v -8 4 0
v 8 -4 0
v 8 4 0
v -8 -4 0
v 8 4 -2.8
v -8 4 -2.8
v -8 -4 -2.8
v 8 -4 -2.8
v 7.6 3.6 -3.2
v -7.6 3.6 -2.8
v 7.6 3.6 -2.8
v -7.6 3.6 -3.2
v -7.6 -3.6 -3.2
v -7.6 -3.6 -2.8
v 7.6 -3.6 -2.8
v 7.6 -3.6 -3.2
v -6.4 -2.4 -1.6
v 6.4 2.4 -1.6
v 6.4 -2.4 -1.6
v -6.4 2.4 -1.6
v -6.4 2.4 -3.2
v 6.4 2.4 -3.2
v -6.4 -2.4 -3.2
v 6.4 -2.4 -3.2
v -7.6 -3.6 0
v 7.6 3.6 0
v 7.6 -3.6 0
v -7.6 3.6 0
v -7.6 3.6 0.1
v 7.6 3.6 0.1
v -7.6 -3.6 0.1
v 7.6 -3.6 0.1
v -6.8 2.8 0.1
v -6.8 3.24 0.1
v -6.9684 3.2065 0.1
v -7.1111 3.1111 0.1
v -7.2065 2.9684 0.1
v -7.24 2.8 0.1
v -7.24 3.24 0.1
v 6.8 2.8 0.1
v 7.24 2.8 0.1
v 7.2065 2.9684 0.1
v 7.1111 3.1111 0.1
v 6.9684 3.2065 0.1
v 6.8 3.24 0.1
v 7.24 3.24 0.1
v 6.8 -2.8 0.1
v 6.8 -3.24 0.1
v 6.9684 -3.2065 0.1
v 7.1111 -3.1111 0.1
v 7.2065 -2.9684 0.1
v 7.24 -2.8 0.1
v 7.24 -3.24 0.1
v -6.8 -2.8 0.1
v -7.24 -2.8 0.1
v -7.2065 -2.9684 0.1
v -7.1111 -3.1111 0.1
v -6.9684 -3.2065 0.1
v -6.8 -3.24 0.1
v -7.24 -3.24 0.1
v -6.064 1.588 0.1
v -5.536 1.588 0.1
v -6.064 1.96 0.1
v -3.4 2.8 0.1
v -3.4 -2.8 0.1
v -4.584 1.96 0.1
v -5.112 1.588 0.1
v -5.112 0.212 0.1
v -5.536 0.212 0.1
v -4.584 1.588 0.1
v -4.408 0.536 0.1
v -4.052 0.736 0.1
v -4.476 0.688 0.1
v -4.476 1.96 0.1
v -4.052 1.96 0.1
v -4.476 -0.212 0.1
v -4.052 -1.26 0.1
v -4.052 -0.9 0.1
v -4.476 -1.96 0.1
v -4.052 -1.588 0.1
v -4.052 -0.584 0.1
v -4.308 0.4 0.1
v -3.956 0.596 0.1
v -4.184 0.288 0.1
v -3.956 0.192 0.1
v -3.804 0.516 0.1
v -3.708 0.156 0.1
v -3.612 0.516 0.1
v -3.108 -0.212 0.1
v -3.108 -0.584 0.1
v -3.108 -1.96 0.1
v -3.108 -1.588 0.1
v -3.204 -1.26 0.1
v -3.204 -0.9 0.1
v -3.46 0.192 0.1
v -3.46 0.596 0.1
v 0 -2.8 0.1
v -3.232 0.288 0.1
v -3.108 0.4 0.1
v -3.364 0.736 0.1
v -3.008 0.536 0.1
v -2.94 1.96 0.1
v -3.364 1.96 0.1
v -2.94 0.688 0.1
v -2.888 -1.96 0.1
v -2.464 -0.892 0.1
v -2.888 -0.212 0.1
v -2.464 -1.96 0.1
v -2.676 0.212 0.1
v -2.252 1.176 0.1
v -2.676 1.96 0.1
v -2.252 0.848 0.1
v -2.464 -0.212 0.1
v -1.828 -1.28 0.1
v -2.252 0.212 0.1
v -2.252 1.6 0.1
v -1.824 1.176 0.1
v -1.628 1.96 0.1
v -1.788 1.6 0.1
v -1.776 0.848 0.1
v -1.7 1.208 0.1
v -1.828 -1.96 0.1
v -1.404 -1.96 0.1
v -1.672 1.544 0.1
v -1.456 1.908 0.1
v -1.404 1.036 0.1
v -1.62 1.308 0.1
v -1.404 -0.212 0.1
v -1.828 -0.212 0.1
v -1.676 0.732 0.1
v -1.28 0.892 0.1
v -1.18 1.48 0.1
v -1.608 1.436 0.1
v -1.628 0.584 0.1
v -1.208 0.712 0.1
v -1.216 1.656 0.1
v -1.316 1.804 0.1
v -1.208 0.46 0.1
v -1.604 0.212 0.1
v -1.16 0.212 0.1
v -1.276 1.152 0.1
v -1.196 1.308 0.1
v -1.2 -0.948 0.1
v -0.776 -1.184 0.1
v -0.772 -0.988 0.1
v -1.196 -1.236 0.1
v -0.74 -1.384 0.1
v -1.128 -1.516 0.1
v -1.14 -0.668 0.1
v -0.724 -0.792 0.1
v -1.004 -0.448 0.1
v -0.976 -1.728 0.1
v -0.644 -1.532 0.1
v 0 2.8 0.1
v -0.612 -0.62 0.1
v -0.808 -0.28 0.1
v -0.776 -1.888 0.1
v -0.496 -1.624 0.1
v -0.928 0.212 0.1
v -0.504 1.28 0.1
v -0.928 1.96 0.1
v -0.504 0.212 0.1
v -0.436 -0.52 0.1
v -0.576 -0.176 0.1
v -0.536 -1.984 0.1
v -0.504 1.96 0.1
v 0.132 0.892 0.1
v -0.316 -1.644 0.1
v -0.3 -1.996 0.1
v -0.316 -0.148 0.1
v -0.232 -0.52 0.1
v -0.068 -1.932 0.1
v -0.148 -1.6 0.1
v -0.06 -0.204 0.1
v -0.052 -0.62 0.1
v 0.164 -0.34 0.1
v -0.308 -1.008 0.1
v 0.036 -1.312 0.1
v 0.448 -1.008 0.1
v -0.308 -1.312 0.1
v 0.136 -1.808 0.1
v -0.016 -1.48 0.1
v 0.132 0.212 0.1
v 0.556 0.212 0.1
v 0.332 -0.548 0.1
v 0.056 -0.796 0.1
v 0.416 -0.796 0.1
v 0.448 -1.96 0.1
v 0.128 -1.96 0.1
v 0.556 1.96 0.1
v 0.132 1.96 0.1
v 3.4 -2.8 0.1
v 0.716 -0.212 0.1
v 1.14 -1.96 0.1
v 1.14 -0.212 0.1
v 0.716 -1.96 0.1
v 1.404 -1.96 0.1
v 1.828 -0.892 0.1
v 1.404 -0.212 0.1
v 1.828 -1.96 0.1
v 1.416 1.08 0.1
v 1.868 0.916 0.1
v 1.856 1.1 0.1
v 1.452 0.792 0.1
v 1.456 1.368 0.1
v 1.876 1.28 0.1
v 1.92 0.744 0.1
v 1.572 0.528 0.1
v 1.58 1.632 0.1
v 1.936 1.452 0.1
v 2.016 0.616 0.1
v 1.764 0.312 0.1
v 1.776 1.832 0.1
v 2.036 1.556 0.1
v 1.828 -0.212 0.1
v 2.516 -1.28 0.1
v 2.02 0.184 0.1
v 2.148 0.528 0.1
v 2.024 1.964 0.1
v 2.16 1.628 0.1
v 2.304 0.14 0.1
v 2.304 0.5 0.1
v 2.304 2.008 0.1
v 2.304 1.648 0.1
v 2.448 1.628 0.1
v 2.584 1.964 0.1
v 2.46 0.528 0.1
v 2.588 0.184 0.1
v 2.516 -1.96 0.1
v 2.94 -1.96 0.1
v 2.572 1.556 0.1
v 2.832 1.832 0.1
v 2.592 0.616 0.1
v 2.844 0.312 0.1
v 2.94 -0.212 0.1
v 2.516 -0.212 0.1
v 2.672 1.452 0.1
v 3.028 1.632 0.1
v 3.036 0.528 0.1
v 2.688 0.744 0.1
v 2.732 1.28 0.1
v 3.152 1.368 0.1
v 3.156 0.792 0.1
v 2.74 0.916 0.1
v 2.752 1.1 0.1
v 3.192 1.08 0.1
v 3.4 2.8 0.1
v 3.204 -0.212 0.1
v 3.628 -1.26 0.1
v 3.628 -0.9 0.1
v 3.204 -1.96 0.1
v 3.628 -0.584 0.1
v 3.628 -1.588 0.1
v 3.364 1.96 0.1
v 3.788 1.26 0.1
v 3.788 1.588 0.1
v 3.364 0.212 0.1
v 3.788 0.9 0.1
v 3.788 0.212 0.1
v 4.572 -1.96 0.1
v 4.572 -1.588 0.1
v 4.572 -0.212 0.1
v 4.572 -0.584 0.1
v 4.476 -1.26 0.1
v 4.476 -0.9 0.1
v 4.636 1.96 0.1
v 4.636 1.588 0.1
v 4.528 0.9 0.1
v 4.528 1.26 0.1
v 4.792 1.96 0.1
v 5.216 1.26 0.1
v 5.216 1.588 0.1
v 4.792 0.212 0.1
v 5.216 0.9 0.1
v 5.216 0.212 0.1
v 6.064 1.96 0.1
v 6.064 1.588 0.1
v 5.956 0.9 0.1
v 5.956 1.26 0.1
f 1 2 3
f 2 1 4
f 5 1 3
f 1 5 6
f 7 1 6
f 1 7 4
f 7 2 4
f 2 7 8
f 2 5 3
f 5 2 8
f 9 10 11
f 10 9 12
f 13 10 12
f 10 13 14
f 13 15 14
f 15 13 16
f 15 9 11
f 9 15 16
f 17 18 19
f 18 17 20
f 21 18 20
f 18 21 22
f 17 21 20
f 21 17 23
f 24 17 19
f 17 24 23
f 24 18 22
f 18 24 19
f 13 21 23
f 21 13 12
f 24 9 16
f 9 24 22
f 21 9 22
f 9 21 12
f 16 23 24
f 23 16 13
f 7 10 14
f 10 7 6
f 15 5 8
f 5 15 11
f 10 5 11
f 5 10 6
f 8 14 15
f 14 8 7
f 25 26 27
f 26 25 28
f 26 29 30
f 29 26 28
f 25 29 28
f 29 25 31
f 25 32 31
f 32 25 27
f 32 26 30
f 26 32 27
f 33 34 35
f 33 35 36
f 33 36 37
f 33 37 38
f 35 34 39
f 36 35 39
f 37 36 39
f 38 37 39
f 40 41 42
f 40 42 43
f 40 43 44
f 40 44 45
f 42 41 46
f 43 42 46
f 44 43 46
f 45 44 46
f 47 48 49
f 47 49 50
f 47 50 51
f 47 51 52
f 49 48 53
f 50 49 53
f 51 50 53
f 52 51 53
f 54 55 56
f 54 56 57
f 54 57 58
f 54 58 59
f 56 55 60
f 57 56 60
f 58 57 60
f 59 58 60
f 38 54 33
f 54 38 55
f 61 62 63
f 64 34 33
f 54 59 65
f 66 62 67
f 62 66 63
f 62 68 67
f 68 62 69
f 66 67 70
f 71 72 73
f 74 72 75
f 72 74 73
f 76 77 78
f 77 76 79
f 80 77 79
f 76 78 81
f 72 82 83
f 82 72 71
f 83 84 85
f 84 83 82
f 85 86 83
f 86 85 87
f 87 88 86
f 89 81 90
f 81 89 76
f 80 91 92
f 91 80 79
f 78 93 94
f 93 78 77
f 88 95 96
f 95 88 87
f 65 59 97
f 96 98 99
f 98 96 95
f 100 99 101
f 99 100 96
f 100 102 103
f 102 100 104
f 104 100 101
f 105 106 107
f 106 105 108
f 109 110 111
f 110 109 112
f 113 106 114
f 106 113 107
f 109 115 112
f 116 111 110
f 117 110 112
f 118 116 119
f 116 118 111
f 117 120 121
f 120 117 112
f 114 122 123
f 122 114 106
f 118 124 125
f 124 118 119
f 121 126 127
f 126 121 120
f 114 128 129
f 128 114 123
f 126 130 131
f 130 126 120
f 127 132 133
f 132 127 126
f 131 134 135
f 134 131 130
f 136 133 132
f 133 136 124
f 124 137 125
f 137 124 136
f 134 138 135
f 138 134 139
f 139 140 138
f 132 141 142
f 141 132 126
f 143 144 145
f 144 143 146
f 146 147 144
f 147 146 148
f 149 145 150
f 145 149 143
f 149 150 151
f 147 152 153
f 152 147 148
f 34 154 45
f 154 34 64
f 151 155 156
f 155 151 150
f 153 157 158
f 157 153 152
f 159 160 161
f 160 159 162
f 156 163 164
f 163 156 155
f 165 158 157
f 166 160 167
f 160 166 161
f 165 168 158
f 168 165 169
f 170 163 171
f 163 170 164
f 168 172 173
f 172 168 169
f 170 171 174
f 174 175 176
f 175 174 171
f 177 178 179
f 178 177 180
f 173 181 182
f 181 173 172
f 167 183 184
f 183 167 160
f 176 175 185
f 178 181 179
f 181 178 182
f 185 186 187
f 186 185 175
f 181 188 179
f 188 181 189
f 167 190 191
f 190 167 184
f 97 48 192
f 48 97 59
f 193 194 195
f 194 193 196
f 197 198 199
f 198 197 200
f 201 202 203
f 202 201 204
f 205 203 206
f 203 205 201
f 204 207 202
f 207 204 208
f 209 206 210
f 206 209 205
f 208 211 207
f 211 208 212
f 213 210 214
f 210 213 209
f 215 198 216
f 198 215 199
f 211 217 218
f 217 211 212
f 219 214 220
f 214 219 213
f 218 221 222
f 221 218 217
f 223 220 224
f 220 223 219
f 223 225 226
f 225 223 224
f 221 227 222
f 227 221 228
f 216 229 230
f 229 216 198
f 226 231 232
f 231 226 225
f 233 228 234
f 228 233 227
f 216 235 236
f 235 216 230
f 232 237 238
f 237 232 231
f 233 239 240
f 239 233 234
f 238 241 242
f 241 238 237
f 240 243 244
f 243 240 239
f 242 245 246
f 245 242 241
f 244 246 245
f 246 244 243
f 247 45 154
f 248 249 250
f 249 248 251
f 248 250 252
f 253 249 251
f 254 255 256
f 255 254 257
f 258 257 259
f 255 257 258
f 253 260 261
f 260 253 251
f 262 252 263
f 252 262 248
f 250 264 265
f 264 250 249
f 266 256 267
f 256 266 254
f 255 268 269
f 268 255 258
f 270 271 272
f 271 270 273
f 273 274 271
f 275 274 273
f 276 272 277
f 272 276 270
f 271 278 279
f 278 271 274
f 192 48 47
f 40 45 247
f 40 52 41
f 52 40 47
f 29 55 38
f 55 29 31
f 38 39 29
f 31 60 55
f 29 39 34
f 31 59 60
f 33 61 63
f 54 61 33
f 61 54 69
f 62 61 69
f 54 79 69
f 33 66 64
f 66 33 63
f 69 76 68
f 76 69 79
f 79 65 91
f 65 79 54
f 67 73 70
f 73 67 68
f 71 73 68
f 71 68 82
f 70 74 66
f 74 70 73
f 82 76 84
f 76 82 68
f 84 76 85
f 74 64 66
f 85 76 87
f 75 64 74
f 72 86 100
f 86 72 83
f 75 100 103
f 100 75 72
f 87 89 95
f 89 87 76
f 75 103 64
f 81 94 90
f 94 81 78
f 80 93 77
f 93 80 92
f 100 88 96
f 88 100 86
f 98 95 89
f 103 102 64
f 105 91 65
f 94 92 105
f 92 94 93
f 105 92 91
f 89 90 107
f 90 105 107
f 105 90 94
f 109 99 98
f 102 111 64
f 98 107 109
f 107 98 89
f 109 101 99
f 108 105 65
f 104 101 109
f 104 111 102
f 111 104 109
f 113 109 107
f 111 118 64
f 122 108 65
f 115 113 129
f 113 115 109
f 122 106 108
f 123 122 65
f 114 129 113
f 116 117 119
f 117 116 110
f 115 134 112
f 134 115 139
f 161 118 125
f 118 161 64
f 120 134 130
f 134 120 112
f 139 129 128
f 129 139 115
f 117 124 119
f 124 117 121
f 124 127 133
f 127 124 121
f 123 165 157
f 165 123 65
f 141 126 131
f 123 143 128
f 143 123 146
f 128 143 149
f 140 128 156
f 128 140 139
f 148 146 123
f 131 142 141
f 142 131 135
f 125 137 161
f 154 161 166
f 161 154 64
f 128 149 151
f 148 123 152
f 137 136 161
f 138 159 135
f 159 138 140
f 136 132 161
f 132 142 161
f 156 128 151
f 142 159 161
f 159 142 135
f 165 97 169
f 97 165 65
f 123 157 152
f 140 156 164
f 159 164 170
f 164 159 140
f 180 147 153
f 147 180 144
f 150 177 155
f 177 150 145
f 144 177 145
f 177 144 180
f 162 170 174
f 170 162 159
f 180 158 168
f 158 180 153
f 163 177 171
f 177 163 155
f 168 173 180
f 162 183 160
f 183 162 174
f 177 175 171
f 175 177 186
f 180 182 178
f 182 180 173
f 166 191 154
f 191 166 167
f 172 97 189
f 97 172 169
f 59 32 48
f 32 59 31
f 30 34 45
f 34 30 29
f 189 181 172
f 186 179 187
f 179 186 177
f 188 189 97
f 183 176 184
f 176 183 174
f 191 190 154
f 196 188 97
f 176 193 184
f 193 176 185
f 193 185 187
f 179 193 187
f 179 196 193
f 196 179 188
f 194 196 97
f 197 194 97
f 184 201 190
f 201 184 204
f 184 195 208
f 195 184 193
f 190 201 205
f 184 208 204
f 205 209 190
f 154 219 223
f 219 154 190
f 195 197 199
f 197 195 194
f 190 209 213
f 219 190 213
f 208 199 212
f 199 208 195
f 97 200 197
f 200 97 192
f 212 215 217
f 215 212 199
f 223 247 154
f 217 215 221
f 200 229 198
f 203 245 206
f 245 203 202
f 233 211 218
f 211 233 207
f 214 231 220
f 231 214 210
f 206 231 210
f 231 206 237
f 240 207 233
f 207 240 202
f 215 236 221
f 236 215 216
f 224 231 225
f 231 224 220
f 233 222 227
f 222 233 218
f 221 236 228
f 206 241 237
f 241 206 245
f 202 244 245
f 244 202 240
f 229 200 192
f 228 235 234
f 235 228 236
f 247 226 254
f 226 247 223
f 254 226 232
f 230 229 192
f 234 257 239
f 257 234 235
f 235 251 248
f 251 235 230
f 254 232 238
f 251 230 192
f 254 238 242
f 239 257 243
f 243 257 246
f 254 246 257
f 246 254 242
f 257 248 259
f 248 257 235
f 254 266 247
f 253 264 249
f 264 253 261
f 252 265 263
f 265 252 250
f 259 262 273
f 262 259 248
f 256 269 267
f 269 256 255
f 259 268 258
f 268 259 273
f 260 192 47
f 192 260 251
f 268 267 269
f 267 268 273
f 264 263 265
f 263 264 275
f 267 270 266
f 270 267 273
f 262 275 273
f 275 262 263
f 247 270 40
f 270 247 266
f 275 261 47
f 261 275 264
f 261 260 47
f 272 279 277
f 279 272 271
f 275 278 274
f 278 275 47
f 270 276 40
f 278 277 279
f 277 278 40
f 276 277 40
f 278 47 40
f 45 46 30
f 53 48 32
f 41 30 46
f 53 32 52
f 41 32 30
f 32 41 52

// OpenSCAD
// file: ../p/box5.scad
use <../lib.scad>
function ldraw_lib__box5() = [
// 0 Box with 5 Faces and All Edges
// 0 Name: box5.dat
// 0 Author: James Jessiman
// 0 !LDRAW_ORG Primitive UPDATE 2012-01
// 0 !LICENSE Licensed under CC BY 4.0 : see CAreadme.txt
// 
// 0 BFC CERTIFY CCW
  [0,"BFC","CERTIFY"],
  [0,"BFC","CCW"],
// 
// 0 !HISTORY 2002-04-03 [sbliss] Modified for BFC compliance
// 0 !HISTORY 2002-04-25 [PTadmin] Official Update 2002-02
// 0 !HISTORY 2007-06-24 [PTadmin] Header formatted for Contributor Agreement
// 0 !HISTORY 2008-07-01 [PTadmin] Official Update 2008-01
// 0 !HISTORY 2012-02-16 [Philo] Changed to CCW
// 0 !HISTORY 2012-03-30 [PTadmin] Official Update 2012-01
// 
// 
// 2 24 1 1 1 -1 1 1
  [2,24,1,1,1,-1,1,1],
// 2 24 -1 1 1 -1 1 -1
  [2,24,-1,1,1,-1,1,-1],
// 2 24 -1 1 -1 1 1 -1
  [2,24,-1,1,-1,1,1,-1],
// 2 24 1 1 -1 1 1 1
  [2,24,1,1,-1,1,1,1],
// 2 24 1 0 1 -1 0 1
  [2,24,1,0,1,-1,0,1],
// 2 24 -1 0 1 -1 0 -1
  [2,24,-1,0,1,-1,0,-1],
// 2 24 -1 0 -1 1 0 -1
  [2,24,-1,0,-1,1,0,-1],
// 2 24 1 0 -1 1 0 1
  [2,24,1,0,-1,1,0,1],
// 2 24 1 0 1 1 1 1
  [2,24,1,0,1,1,1,1],
// 2 24 -1 0 1 -1 1 1
  [2,24,-1,0,1,-1,1,1],
// 2 24 1 0 -1 1 1 -1
  [2,24,1,0,-1,1,1,-1],
// 2 24 -1 0 -1 -1 1 -1
  [2,24,-1,0,-1,-1,1,-1],
// 4 16 -1 1 1 1 1 1 1 1 -1 -1 1 -1
  [4,16,-1,1,1,1,1,1,1,1,-1,-1,1,-1],
// 4 16 -1 1 1 -1 0 1 1 0 1 1 1 1
  [4,16,-1,1,1,-1,0,1,1,0,1,1,1,1],
// 4 16 -1 1 -1 -1 0 -1 -1 0 1 -1 1 1
  [4,16,-1,1,-1,-1,0,-1,-1,0,1,-1,1,1],
// 4 16 1 1 -1 1 0 -1 -1 0 -1 -1 1 -1
  [4,16,1,1,-1,1,0,-1,-1,0,-1,-1,1,-1],
// 4 16 1 1 1 1 0 1 1 0 -1 1 1 -1
  [4,16,1,1,1,1,0,1,1,0,-1,1,1,-1],
];
module ldraw_lib__box5(step=0, col=false, unit=2/5, alt=false, line=0.2, solid=!$preview)
    makepoly(ldraw_lib__box5(), step=step, col=col, unit=unit, alt=alt, line=line, solid=solid);
ldraw_lib__box5(line=0.2);
// file: ../p/box4.scad
use <../lib.scad>
function ldraw_lib__box4() = [
// 0 Box with 4 Faces (2 Parallel Pairs) and All Edges
// 0 Name: box4.dat
// 0 Author: James Jessiman
// 0 !LDRAW_ORG Primitive UPDATE 2012-01
// 0 !LICENSE Licensed under CC BY 4.0 : see CAreadme.txt
// 
// 0 BFC CERTIFY CCW
  [0,"BFC","CERTIFY"],
  [0,"BFC","CCW"],
// 
// 0 !HISTORY 2002-04-03 [sbliss] Modified for BFC compliance
// 0 !HISTORY 2002-04-25 [PTadmin] Official Update 2002-02
// 0 !HISTORY 2007-06-24 [PTadmin] Header formatted for Contributor Agreement
// 0 !HISTORY 2008-07-01 [PTadmin] Official Update 2008-01
// 0 !HISTORY 2012-02-16 [Philo] Changed to CCW
// 0 !HISTORY 2012-03-30 [PTadmin] Official Update 2012-01
// 
// 
// 2 24 1 1 1 -1 1 1
  [2,24,1,1,1,-1,1,1],
// 2 24 -1 1 1 -1 1 -1
  [2,24,-1,1,1,-1,1,-1],
// 2 24 -1 1 -1 1 1 -1
  [2,24,-1,1,-1,1,1,-1],
// 2 24 1 1 -1 1 1 1
  [2,24,1,1,-1,1,1,1],
// 2 24 1 0 1 -1 0 1
  [2,24,1,0,1,-1,0,1],
// 2 24 -1 0 1 -1 0 -1
  [2,24,-1,0,1,-1,0,-1],
// 2 24 -1 0 -1 1 0 -1
  [2,24,-1,0,-1,1,0,-1],
// 2 24 1 0 -1 1 0 1
  [2,24,1,0,-1,1,0,1],
// 2 24 1 0 1 1 1 1
  [2,24,1,0,1,1,1,1],
// 2 24 -1 0 1 -1 1 1
  [2,24,-1,0,1,-1,1,1],
// 2 24 1 0 -1 1 1 -1
  [2,24,1,0,-1,1,1,-1],
// 2 24 -1 0 -1 -1 1 -1
  [2,24,-1,0,-1,-1,1,-1],
// 4 16 -1 1 1 -1 0 1 1 0 1 1 1 1
  [4,16,-1,1,1,-1,0,1,1,0,1,1,1,1],
// 4 16 -1 1 -1 -1 0 -1 -1 0 1 -1 1 1
  [4,16,-1,1,-1,-1,0,-1,-1,0,1,-1,1,1],
// 4 16 1 1 -1 1 0 -1 -1 0 -1 -1 1 -1
  [4,16,1,1,-1,1,0,-1,-1,0,-1,-1,1,-1],
// 4 16 1 1 1 1 0 1 1 0 -1 1 1 -1
  [4,16,1,1,1,1,0,1,1,0,-1,1,1,-1],
];
module ldraw_lib__box4(step=0, col=false, unit=2/5, alt=false, line=0.2, solid=!$preview)
    makepoly(ldraw_lib__box4(), step=step, col=col, unit=unit, alt=alt, line=line, solid=solid);
ldraw_lib__box4(line=0.2);
// file: ../p/1-4ndis.scad
use <../lib.scad>
function ldraw_lib__1_4ndis() = [
// 0 Disc Negative 0.25
// 0 Name: 1-4ndis.dat
// 0 Author: James Jessiman
// 0 !LDRAW_ORG Primitive UPDATE 2012-01
// 0 !LICENSE Licensed under CC BY 4.0 : see CAreadme.txt
// 
// 0 BFC CERTIFY CCW
  [0,"BFC","CERTIFY"],
  [0,"BFC","CCW"],
// 
// 0 !HISTORY 2002-03-23 [sbliss] Added BFC Statement
// 0 !HISTORY 2002-04-25 [PTadmin] Official Update 2002-02
// 0 !HISTORY 2007-06-22 [PTadmin] Header formatted for Contributor Agreement
// 0 !HISTORY 2008-07-01 [PTadmin] Official Update 2008-01
// 0 !HISTORY 2012-02-16 [Philo] Changed to CCW
// 0 !HISTORY 2012-03-30 [PTadmin] Official Update 2012-01
// 
// 
// 3 16 0.9239 0 0.3827 1 0 0 1 0 1
  [3,16,0.9239,0,0.3827,1,0,0,1,0,1],
// 3 16 0.7071 0 0.7071 0.9239 0 0.3827 1 0 1
  [3,16,0.7071,0,0.7071,0.9239,0,0.3827,1,0,1],
// 3 16 0.3827 0 0.9239 0.7071 0 0.7071 1 0 1
  [3,16,0.3827,0,0.9239,0.7071,0,0.7071,1,0,1],
// 3 16 0 0 1 0.3827 0 0.9239 1 0 1
  [3,16,0,0,1,0.3827,0,0.9239,1,0,1],
];
module ldraw_lib__1_4ndis(step=0, col=false, unit=2/5, alt=false, line=0.2, solid=!$preview)
    makepoly(ldraw_lib__1_4ndis(), step=step, col=col, unit=unit, alt=alt, line=line, solid=solid);
ldraw_lib__1_4ndis(line=0.2);
// file: ../p/1-4disc.scad
use <../lib.scad>
function ldraw_lib__1_4disc() = [
// 0 Disc 0.25
// 0 Name: 1-4disc.dat
// 0 Author: James Jessiman
// 0 !LDRAW_ORG Primitive UPDATE 2002-02
// 0 !LICENSE Licensed under CC BY 4.0 : see CAreadme.txt
// 
// 0 BFC CERTIFY CCW
  [0,"BFC","CERTIFY"],
  [0,"BFC","CCW"],
// 
// 0 !HISTORY 2002-03-23 [sbliss] Added BFC statement.
// 0 !HISTORY 2002-04-25 [PTadmin] Official Update 2002-02
// 0 !HISTORY 2007-06-22 [PTadmin] Header formatted for Contributor Agreement
// 0 !HISTORY 2008-07-01 [PTadmin] Official Update 2008-01
// 
// 
// 3 16 0 0 0 1 0 0 0.9239 0 0.3827
  [3,16,0,0,0,1,0,0,0.9239,0,0.3827],
// 3 16 0 0 0 0.9239 0 0.3827 0.7071 0 0.7071
  [3,16,0,0,0,0.9239,0,0.3827,0.7071,0,0.7071],
// 3 16 0 0 0 0.7071 0 0.7071 0.3827 0 0.9239
  [3,16,0,0,0,0.7071,0,0.7071,0.3827,0,0.9239],
// 3 16 0 0 0 0.3827 0 0.9239 0 0 1
  [3,16,0,0,0,0.3827,0,0.9239,0,0,1],
// 0
];
module ldraw_lib__1_4disc(step=0, col=false, unit=2/5, alt=false, line=0.2, solid=!$preview)
    makepoly(ldraw_lib__1_4disc(), step=step, col=col, unit=unit, alt=alt, line=line, solid=solid);
ldraw_lib__1_4disc(line=0.2);
// file: s/3069bs01.scad
use <../../lib.scad>
use <../../p/box4.scad>
use <../../p/box5.scad>
function ldraw_lib__s__3069bs01() = [
// 0 ~Tile  1 x  2 with Groove without Top Face
// 0 Name: s\3069bs01.dat
// 0 Author: Santeri Piippo [arezey]
// 0 !LDRAW_ORG Subpart UPDATE 2010-02
// 0 !LICENSE Licensed under CC BY 4.0 : see CAreadme.txt
// 
// 0 BFC CERTIFY CCW
  [0,"BFC","CERTIFY"],
  [0,"BFC","CCW"],
// 
// 0 !HISTORY 2010-07-05 [PTadmin] Official Update 2010-02
// 
// 
// 1 16 0 0 0 20 0 0 0 7 0 0 0 10 box4.dat
  [1,16,0,0,0,20,0,0,0,7,0,0,0,10, ldraw_lib__box4()],
// 1 16 0 7 0 19 0 0 0 1 0 0 0 9 box4.dat
  [1,16,0,7,0,19,0,0,0,1,0,0,0,9, ldraw_lib__box4()],
// 0 BFC INVERTNEXT
  [0,"BFC","INVERTNEXT"],
// 1 16 0 8 0 16 0 0 0 -4 0 0 0 6 box5.dat
  [1,16,0,8,0,16,0,0,0,-4,0,0,0,6, ldraw_lib__box5()],
// 4 16 -19 8 9 -16 8 6 -16 8 -6 -19 8 -9
  [4,16,-19,8,9,-16,8,6,-16,8,-6,-19,8,-9],
// 4 16 19 8 -9 16 8 -6 16 8 6 19 8 9
  [4,16,19,8,-9,16,8,-6,16,8,6,19,8,9],
// 4 16 19 8 9 16 8 6 -16 8 6 -19 8 9
  [4,16,19,8,9,16,8,6,-16,8,6,-19,8,9],
// 4 16 -19 8 -9 -16 8 -6 16 8 -6 19 8 -9
  [4,16,-19,8,-9,-16,8,-6,16,8,-6,19,8,-9],
// 4 16 -20 7 10 -19 7 9 -19 7 -9 -20 7 -10
  [4,16,-20,7,10,-19,7,9,-19,7,-9,-20,7,-10],
// 4 16 20 7 -10 19 7 -9 19 7 9 20 7 10
  [4,16,20,7,-10,19,7,-9,19,7,9,20,7,10],
// 4 16 20 7 10 19 7 9 -19 7 9 -20 7 10
  [4,16,20,7,10,19,7,9,-19,7,9,-20,7,10],
// 4 16 -20 7 -10 -19 7 -9 19 7 -9 20 7 -10
  [4,16,-20,7,-10,-19,7,-9,19,7,-9,20,7,-10],
// 0 //
];
module ldraw_lib__s__3069bs01(step=0, col=false, unit=2/5, alt=false, line=0.2, solid=!$preview)
    makepoly(ldraw_lib__s__3069bs01(), step=step, col=col, unit=unit, alt=alt, line=line, solid=solid);
ldraw_lib__s__3069bs01(line=0.2);
// file: ../p/box5-12.scad
use <../lib.scad>
function ldraw_lib__box5_12() = [
// 0 Box with 5 Faces without Any Edges
// 0 Name: box5-12.dat
// 0 Author: Chris Dee [cwdee]
// 0 !LDRAW_ORG Primitive UPDATE 2009-02
// 0 !LICENSE Licensed under CC BY 4.0 : see CAreadme.txt
// 
// 0 BFC CERTIFY CCW
  [0,"BFC","CERTIFY"],
  [0,"BFC","CCW"],
// 
// 0 !HISTORY 2009-09-03 [PTadmin] Official Update 2009-02
// 
// 
// 4 16 1 1 1 1 1 -1 -1 1 -1 -1 1 1
  [4,16,1,1,1,1,1,-1,-1,1,-1,-1,1,1],
// 4 16 -1 0 1 1 0 1 1 1 1 -1 1 1
  [4,16,-1,0,1,1,0,1,1,1,1,-1,1,1],
// 4 16 -1 0 -1 -1 0 1 -1 1 1 -1 1 -1
  [4,16,-1,0,-1,-1,0,1,-1,1,1,-1,1,-1],
// 4 16 1 0 -1 -1 0 -1 -1 1 -1 1 1 -1
  [4,16,1,0,-1,-1,0,-1,-1,1,-1,1,1,-1],
// 4 16 1 0 1 1 0 -1 1 1 -1 1 1 1
  [4,16,1,0,1,1,0,-1,1,1,-1,1,1,1],
// 0
];
module ldraw_lib__box5_12(step=0, col=false, unit=2/5, alt=false, line=0.2, solid=!$preview)
    makepoly(ldraw_lib__box5_12(), step=step, col=col, unit=unit, alt=alt, line=line, solid=solid);
ldraw_lib__box5_12(line=0.2);
// file: 3069b.scad
use <../lib.scad>
use <s/3069bs01.scad>
function ldraw_lib__3069b() = [
// 0 Tile  1 x  2 with Groove
// 0 Name: 3069b.dat
// 0 Author: Santeri Piippo [arezey]
// 0 !LDRAW_ORG Part UPDATE 2010-02
// 0 !LICENSE Licensed under CC BY 4.0 : see CAreadme.txt
// 
// 0 BFC CERTIFY CCW
  [0,"BFC","CERTIFY"],
  [0,"BFC","CCW"],
// 
// 0 !HISTORY 2010-07-05 [PTadmin] Official Update 2010-02
// 
// 
// 4 16 20 0 -10 20 0 10 -20 0 10 -20 0 -10
  [4,16,20,0,-10,20,0,10,-20,0,10,-20,0,-10],
// 1 16 0 0 0 1 0 0 0 1 0 0 0 1 s\3069bs01.dat
  [1,16,0,0,0,1,0,0,0,1,0,0,0,1, ldraw_lib__s__3069bs01()],
// 0 //
];
module ldraw_lib__3069b(step=0, col=false, unit=2/5, alt=false, line=0.2, solid=!$preview)
    makepoly(ldraw_lib__3069b(), step=step, col=col, unit=unit, alt=alt, line=line, solid=solid);
ldraw_lib__3069b(line=0.2);
// file: 197915a.scad
use <../lib.scad>
use <../p/box5-12.scad>
use <s/197915as01.scad>
function ldraw_lib__197915a() = [
// 0 Sticker  0.9 x  1.9 with Black "TURN OFF ENGINE" and Border
// 0 Name: 197915a.dat
// 0 Author: N. W. Perry [Plastikean]
// 0 !LDRAW_ORG Part UPDATE 2024-03
// 0 !LICENSE Licensed under CC BY 4.0 : see CAreadme.txt
// 
// 0 BFC CERTIFY CCW
  [0,"BFC","CERTIFY"],
  [0,"BFC","CCW"],
// 
// 0 !KEYWORDS Bricklink 5540stk01, set 5540
// 
// 0 !HISTORY 2020-12-29 [PTadmin] Official Update 2020-03
// 0 !HISTORY 2022-10-06 [RainbowDolphin] Subfiled pattern
// 0 !HISTORY 2024-04-28 [OrionP] Official Update 2024-03
// 
// 
// 1 16 0 -0.25 0 19 0 0 0 0.25 0 0 0 9 box5-12.dat
  [1,16,0,-0.25,0,19,0,0,0,0.25,0,0,0,9, ldraw_lib__box5_12()],
// 
// 1 16 0 -.25 0 1 0 0 0 1 0 0 0 1 s\197915as01.dat
  [1,16,0,-.25,0,1,0,0,0,1,0,0,0,1, ldraw_lib__s__197915as01()],
// 
// 3 16 -18.1 -.25 8.1 -17 -.25 8.1 -19 -.25 9
  [3,16,-18.1,-.25,8.1,-17,-.25,8.1,-19,-.25,9],
// 4 16 -19 -.25 9 -17 -.25 8.1 17 -.25 8.1 19 -.25 9
  [4,16,-19,-.25,9,-17,-.25,8.1,17,-.25,8.1,19,-.25,9],
// 3 16 19 -.25 9 17 -.25 8.1 18.1 -.25 8.1
  [3,16,19,-.25,9,17,-.25,8.1,18.1,-.25,8.1],
// 3 16 19 -.25 9 18.1 -.25 8.1 18.1 -.25 7
  [3,16,19,-.25,9,18.1,-.25,8.1,18.1,-.25,7],
// 4 16 19 -.25 9 18.1 -.25 7 18.1 -.25 -7 19 -.25 -9
  [4,16,19,-.25,9,18.1,-.25,7,18.1,-.25,-7,19,-.25,-9],
// 3 16 19 -.25 -9 18.1 -.25 -7 18.1 -.25 -8.1
  [3,16,19,-.25,-9,18.1,-.25,-7,18.1,-.25,-8.1],
// 3 16 19 -.25 -9 18.1 -.25 -8.1 17 -.25 -8.1
  [3,16,19,-.25,-9,18.1,-.25,-8.1,17,-.25,-8.1],
// 4 16 19 -.25 -9 17 -.25 -8.1 -17 -.25 -8.1 -19 -.25 -9
  [4,16,19,-.25,-9,17,-.25,-8.1,-17,-.25,-8.1,-19,-.25,-9],
// 3 16 -19 -.25 -9 -17 -.25 -8.1 -18.1 -.25 -8.1
  [3,16,-19,-.25,-9,-17,-.25,-8.1,-18.1,-.25,-8.1],
// 3 16 -19 -.25 -9 -18.1 -.25 -8.1 -18.1 -.25 -7
  [3,16,-19,-.25,-9,-18.1,-.25,-8.1,-18.1,-.25,-7],
// 4 16 -19 -.25 -9 -18.1 -.25 -7 -18.1 -.25 7 -19 -.25 9
  [4,16,-19,-.25,-9,-18.1,-.25,-7,-18.1,-.25,7,-19,-.25,9],
// 3 16 -18.1 -.25 8.1 -19 -.25 9 -18.1 -.25 7
  [3,16,-18.1,-.25,8.1,-19,-.25,9,-18.1,-.25,7],
];
module ldraw_lib__197915a(step=0, col=false, unit=2/5, alt=false, line=0.2, solid=!$preview)
    makepoly(ldraw_lib__197915a(), step=step, col=col, unit=unit, alt=alt, line=line, solid=solid);
ldraw_lib__197915a(line=0.2);
// main file
use <../lib.scad>
use <197915a.scad>
use <3069b.scad>
function ldraw_lib__3069bd0c() = [
// 0 Tile  1 x  2 with "TURN OFF ENGINE" Sticker
// 0 Name: 3069bd0c.dat
// 0 Author: Takeshi Takahashi [RainbowDolphin]
// 0 !LDRAW_ORG Shortcut UPDATE 2024-07
// 0 !LICENSE Licensed under CC BY 4.0 : see CAreadme.txt
// 
// 0 BFC CERTIFY CCW
  [0,"BFC","CERTIFY"],
  [0,"BFC","CCW"],
// 
// 0 !CATEGORY Sticker Shortcut
// 0 !KEYWORDS Bricklink 3069pb0070, Formula 1, Model Team, set 5540
// 
// 0 !HISTORY 2024-08-26 [OrionP] Official Update 2024-07
// 
// 1 16 0 0 0 1 0 0 0 1 0 0 0 1 3069b.dat
  [1,16,0,0,0,1,0,0,0,1,0,0,0,1, ldraw_lib__3069b()],
// 1 16 0 0 0 1 0 0 0 1 0 0 0 1 197915a.dat
  [1,16,0,0,0,1,0,0,0,1,0,0,0,1, ldraw_lib__197915a()],
];
module ldraw_lib__3069bd0c(step=0, col=false, unit=2/5, alt=false, line=0.2, solid=!$preview)
    makepoly(ldraw_lib__3069bd0c(), step=step, col=col, unit=unit, alt=alt, line=line, solid=solid);
ldraw_lib__3069bd0c(line=0.2);
